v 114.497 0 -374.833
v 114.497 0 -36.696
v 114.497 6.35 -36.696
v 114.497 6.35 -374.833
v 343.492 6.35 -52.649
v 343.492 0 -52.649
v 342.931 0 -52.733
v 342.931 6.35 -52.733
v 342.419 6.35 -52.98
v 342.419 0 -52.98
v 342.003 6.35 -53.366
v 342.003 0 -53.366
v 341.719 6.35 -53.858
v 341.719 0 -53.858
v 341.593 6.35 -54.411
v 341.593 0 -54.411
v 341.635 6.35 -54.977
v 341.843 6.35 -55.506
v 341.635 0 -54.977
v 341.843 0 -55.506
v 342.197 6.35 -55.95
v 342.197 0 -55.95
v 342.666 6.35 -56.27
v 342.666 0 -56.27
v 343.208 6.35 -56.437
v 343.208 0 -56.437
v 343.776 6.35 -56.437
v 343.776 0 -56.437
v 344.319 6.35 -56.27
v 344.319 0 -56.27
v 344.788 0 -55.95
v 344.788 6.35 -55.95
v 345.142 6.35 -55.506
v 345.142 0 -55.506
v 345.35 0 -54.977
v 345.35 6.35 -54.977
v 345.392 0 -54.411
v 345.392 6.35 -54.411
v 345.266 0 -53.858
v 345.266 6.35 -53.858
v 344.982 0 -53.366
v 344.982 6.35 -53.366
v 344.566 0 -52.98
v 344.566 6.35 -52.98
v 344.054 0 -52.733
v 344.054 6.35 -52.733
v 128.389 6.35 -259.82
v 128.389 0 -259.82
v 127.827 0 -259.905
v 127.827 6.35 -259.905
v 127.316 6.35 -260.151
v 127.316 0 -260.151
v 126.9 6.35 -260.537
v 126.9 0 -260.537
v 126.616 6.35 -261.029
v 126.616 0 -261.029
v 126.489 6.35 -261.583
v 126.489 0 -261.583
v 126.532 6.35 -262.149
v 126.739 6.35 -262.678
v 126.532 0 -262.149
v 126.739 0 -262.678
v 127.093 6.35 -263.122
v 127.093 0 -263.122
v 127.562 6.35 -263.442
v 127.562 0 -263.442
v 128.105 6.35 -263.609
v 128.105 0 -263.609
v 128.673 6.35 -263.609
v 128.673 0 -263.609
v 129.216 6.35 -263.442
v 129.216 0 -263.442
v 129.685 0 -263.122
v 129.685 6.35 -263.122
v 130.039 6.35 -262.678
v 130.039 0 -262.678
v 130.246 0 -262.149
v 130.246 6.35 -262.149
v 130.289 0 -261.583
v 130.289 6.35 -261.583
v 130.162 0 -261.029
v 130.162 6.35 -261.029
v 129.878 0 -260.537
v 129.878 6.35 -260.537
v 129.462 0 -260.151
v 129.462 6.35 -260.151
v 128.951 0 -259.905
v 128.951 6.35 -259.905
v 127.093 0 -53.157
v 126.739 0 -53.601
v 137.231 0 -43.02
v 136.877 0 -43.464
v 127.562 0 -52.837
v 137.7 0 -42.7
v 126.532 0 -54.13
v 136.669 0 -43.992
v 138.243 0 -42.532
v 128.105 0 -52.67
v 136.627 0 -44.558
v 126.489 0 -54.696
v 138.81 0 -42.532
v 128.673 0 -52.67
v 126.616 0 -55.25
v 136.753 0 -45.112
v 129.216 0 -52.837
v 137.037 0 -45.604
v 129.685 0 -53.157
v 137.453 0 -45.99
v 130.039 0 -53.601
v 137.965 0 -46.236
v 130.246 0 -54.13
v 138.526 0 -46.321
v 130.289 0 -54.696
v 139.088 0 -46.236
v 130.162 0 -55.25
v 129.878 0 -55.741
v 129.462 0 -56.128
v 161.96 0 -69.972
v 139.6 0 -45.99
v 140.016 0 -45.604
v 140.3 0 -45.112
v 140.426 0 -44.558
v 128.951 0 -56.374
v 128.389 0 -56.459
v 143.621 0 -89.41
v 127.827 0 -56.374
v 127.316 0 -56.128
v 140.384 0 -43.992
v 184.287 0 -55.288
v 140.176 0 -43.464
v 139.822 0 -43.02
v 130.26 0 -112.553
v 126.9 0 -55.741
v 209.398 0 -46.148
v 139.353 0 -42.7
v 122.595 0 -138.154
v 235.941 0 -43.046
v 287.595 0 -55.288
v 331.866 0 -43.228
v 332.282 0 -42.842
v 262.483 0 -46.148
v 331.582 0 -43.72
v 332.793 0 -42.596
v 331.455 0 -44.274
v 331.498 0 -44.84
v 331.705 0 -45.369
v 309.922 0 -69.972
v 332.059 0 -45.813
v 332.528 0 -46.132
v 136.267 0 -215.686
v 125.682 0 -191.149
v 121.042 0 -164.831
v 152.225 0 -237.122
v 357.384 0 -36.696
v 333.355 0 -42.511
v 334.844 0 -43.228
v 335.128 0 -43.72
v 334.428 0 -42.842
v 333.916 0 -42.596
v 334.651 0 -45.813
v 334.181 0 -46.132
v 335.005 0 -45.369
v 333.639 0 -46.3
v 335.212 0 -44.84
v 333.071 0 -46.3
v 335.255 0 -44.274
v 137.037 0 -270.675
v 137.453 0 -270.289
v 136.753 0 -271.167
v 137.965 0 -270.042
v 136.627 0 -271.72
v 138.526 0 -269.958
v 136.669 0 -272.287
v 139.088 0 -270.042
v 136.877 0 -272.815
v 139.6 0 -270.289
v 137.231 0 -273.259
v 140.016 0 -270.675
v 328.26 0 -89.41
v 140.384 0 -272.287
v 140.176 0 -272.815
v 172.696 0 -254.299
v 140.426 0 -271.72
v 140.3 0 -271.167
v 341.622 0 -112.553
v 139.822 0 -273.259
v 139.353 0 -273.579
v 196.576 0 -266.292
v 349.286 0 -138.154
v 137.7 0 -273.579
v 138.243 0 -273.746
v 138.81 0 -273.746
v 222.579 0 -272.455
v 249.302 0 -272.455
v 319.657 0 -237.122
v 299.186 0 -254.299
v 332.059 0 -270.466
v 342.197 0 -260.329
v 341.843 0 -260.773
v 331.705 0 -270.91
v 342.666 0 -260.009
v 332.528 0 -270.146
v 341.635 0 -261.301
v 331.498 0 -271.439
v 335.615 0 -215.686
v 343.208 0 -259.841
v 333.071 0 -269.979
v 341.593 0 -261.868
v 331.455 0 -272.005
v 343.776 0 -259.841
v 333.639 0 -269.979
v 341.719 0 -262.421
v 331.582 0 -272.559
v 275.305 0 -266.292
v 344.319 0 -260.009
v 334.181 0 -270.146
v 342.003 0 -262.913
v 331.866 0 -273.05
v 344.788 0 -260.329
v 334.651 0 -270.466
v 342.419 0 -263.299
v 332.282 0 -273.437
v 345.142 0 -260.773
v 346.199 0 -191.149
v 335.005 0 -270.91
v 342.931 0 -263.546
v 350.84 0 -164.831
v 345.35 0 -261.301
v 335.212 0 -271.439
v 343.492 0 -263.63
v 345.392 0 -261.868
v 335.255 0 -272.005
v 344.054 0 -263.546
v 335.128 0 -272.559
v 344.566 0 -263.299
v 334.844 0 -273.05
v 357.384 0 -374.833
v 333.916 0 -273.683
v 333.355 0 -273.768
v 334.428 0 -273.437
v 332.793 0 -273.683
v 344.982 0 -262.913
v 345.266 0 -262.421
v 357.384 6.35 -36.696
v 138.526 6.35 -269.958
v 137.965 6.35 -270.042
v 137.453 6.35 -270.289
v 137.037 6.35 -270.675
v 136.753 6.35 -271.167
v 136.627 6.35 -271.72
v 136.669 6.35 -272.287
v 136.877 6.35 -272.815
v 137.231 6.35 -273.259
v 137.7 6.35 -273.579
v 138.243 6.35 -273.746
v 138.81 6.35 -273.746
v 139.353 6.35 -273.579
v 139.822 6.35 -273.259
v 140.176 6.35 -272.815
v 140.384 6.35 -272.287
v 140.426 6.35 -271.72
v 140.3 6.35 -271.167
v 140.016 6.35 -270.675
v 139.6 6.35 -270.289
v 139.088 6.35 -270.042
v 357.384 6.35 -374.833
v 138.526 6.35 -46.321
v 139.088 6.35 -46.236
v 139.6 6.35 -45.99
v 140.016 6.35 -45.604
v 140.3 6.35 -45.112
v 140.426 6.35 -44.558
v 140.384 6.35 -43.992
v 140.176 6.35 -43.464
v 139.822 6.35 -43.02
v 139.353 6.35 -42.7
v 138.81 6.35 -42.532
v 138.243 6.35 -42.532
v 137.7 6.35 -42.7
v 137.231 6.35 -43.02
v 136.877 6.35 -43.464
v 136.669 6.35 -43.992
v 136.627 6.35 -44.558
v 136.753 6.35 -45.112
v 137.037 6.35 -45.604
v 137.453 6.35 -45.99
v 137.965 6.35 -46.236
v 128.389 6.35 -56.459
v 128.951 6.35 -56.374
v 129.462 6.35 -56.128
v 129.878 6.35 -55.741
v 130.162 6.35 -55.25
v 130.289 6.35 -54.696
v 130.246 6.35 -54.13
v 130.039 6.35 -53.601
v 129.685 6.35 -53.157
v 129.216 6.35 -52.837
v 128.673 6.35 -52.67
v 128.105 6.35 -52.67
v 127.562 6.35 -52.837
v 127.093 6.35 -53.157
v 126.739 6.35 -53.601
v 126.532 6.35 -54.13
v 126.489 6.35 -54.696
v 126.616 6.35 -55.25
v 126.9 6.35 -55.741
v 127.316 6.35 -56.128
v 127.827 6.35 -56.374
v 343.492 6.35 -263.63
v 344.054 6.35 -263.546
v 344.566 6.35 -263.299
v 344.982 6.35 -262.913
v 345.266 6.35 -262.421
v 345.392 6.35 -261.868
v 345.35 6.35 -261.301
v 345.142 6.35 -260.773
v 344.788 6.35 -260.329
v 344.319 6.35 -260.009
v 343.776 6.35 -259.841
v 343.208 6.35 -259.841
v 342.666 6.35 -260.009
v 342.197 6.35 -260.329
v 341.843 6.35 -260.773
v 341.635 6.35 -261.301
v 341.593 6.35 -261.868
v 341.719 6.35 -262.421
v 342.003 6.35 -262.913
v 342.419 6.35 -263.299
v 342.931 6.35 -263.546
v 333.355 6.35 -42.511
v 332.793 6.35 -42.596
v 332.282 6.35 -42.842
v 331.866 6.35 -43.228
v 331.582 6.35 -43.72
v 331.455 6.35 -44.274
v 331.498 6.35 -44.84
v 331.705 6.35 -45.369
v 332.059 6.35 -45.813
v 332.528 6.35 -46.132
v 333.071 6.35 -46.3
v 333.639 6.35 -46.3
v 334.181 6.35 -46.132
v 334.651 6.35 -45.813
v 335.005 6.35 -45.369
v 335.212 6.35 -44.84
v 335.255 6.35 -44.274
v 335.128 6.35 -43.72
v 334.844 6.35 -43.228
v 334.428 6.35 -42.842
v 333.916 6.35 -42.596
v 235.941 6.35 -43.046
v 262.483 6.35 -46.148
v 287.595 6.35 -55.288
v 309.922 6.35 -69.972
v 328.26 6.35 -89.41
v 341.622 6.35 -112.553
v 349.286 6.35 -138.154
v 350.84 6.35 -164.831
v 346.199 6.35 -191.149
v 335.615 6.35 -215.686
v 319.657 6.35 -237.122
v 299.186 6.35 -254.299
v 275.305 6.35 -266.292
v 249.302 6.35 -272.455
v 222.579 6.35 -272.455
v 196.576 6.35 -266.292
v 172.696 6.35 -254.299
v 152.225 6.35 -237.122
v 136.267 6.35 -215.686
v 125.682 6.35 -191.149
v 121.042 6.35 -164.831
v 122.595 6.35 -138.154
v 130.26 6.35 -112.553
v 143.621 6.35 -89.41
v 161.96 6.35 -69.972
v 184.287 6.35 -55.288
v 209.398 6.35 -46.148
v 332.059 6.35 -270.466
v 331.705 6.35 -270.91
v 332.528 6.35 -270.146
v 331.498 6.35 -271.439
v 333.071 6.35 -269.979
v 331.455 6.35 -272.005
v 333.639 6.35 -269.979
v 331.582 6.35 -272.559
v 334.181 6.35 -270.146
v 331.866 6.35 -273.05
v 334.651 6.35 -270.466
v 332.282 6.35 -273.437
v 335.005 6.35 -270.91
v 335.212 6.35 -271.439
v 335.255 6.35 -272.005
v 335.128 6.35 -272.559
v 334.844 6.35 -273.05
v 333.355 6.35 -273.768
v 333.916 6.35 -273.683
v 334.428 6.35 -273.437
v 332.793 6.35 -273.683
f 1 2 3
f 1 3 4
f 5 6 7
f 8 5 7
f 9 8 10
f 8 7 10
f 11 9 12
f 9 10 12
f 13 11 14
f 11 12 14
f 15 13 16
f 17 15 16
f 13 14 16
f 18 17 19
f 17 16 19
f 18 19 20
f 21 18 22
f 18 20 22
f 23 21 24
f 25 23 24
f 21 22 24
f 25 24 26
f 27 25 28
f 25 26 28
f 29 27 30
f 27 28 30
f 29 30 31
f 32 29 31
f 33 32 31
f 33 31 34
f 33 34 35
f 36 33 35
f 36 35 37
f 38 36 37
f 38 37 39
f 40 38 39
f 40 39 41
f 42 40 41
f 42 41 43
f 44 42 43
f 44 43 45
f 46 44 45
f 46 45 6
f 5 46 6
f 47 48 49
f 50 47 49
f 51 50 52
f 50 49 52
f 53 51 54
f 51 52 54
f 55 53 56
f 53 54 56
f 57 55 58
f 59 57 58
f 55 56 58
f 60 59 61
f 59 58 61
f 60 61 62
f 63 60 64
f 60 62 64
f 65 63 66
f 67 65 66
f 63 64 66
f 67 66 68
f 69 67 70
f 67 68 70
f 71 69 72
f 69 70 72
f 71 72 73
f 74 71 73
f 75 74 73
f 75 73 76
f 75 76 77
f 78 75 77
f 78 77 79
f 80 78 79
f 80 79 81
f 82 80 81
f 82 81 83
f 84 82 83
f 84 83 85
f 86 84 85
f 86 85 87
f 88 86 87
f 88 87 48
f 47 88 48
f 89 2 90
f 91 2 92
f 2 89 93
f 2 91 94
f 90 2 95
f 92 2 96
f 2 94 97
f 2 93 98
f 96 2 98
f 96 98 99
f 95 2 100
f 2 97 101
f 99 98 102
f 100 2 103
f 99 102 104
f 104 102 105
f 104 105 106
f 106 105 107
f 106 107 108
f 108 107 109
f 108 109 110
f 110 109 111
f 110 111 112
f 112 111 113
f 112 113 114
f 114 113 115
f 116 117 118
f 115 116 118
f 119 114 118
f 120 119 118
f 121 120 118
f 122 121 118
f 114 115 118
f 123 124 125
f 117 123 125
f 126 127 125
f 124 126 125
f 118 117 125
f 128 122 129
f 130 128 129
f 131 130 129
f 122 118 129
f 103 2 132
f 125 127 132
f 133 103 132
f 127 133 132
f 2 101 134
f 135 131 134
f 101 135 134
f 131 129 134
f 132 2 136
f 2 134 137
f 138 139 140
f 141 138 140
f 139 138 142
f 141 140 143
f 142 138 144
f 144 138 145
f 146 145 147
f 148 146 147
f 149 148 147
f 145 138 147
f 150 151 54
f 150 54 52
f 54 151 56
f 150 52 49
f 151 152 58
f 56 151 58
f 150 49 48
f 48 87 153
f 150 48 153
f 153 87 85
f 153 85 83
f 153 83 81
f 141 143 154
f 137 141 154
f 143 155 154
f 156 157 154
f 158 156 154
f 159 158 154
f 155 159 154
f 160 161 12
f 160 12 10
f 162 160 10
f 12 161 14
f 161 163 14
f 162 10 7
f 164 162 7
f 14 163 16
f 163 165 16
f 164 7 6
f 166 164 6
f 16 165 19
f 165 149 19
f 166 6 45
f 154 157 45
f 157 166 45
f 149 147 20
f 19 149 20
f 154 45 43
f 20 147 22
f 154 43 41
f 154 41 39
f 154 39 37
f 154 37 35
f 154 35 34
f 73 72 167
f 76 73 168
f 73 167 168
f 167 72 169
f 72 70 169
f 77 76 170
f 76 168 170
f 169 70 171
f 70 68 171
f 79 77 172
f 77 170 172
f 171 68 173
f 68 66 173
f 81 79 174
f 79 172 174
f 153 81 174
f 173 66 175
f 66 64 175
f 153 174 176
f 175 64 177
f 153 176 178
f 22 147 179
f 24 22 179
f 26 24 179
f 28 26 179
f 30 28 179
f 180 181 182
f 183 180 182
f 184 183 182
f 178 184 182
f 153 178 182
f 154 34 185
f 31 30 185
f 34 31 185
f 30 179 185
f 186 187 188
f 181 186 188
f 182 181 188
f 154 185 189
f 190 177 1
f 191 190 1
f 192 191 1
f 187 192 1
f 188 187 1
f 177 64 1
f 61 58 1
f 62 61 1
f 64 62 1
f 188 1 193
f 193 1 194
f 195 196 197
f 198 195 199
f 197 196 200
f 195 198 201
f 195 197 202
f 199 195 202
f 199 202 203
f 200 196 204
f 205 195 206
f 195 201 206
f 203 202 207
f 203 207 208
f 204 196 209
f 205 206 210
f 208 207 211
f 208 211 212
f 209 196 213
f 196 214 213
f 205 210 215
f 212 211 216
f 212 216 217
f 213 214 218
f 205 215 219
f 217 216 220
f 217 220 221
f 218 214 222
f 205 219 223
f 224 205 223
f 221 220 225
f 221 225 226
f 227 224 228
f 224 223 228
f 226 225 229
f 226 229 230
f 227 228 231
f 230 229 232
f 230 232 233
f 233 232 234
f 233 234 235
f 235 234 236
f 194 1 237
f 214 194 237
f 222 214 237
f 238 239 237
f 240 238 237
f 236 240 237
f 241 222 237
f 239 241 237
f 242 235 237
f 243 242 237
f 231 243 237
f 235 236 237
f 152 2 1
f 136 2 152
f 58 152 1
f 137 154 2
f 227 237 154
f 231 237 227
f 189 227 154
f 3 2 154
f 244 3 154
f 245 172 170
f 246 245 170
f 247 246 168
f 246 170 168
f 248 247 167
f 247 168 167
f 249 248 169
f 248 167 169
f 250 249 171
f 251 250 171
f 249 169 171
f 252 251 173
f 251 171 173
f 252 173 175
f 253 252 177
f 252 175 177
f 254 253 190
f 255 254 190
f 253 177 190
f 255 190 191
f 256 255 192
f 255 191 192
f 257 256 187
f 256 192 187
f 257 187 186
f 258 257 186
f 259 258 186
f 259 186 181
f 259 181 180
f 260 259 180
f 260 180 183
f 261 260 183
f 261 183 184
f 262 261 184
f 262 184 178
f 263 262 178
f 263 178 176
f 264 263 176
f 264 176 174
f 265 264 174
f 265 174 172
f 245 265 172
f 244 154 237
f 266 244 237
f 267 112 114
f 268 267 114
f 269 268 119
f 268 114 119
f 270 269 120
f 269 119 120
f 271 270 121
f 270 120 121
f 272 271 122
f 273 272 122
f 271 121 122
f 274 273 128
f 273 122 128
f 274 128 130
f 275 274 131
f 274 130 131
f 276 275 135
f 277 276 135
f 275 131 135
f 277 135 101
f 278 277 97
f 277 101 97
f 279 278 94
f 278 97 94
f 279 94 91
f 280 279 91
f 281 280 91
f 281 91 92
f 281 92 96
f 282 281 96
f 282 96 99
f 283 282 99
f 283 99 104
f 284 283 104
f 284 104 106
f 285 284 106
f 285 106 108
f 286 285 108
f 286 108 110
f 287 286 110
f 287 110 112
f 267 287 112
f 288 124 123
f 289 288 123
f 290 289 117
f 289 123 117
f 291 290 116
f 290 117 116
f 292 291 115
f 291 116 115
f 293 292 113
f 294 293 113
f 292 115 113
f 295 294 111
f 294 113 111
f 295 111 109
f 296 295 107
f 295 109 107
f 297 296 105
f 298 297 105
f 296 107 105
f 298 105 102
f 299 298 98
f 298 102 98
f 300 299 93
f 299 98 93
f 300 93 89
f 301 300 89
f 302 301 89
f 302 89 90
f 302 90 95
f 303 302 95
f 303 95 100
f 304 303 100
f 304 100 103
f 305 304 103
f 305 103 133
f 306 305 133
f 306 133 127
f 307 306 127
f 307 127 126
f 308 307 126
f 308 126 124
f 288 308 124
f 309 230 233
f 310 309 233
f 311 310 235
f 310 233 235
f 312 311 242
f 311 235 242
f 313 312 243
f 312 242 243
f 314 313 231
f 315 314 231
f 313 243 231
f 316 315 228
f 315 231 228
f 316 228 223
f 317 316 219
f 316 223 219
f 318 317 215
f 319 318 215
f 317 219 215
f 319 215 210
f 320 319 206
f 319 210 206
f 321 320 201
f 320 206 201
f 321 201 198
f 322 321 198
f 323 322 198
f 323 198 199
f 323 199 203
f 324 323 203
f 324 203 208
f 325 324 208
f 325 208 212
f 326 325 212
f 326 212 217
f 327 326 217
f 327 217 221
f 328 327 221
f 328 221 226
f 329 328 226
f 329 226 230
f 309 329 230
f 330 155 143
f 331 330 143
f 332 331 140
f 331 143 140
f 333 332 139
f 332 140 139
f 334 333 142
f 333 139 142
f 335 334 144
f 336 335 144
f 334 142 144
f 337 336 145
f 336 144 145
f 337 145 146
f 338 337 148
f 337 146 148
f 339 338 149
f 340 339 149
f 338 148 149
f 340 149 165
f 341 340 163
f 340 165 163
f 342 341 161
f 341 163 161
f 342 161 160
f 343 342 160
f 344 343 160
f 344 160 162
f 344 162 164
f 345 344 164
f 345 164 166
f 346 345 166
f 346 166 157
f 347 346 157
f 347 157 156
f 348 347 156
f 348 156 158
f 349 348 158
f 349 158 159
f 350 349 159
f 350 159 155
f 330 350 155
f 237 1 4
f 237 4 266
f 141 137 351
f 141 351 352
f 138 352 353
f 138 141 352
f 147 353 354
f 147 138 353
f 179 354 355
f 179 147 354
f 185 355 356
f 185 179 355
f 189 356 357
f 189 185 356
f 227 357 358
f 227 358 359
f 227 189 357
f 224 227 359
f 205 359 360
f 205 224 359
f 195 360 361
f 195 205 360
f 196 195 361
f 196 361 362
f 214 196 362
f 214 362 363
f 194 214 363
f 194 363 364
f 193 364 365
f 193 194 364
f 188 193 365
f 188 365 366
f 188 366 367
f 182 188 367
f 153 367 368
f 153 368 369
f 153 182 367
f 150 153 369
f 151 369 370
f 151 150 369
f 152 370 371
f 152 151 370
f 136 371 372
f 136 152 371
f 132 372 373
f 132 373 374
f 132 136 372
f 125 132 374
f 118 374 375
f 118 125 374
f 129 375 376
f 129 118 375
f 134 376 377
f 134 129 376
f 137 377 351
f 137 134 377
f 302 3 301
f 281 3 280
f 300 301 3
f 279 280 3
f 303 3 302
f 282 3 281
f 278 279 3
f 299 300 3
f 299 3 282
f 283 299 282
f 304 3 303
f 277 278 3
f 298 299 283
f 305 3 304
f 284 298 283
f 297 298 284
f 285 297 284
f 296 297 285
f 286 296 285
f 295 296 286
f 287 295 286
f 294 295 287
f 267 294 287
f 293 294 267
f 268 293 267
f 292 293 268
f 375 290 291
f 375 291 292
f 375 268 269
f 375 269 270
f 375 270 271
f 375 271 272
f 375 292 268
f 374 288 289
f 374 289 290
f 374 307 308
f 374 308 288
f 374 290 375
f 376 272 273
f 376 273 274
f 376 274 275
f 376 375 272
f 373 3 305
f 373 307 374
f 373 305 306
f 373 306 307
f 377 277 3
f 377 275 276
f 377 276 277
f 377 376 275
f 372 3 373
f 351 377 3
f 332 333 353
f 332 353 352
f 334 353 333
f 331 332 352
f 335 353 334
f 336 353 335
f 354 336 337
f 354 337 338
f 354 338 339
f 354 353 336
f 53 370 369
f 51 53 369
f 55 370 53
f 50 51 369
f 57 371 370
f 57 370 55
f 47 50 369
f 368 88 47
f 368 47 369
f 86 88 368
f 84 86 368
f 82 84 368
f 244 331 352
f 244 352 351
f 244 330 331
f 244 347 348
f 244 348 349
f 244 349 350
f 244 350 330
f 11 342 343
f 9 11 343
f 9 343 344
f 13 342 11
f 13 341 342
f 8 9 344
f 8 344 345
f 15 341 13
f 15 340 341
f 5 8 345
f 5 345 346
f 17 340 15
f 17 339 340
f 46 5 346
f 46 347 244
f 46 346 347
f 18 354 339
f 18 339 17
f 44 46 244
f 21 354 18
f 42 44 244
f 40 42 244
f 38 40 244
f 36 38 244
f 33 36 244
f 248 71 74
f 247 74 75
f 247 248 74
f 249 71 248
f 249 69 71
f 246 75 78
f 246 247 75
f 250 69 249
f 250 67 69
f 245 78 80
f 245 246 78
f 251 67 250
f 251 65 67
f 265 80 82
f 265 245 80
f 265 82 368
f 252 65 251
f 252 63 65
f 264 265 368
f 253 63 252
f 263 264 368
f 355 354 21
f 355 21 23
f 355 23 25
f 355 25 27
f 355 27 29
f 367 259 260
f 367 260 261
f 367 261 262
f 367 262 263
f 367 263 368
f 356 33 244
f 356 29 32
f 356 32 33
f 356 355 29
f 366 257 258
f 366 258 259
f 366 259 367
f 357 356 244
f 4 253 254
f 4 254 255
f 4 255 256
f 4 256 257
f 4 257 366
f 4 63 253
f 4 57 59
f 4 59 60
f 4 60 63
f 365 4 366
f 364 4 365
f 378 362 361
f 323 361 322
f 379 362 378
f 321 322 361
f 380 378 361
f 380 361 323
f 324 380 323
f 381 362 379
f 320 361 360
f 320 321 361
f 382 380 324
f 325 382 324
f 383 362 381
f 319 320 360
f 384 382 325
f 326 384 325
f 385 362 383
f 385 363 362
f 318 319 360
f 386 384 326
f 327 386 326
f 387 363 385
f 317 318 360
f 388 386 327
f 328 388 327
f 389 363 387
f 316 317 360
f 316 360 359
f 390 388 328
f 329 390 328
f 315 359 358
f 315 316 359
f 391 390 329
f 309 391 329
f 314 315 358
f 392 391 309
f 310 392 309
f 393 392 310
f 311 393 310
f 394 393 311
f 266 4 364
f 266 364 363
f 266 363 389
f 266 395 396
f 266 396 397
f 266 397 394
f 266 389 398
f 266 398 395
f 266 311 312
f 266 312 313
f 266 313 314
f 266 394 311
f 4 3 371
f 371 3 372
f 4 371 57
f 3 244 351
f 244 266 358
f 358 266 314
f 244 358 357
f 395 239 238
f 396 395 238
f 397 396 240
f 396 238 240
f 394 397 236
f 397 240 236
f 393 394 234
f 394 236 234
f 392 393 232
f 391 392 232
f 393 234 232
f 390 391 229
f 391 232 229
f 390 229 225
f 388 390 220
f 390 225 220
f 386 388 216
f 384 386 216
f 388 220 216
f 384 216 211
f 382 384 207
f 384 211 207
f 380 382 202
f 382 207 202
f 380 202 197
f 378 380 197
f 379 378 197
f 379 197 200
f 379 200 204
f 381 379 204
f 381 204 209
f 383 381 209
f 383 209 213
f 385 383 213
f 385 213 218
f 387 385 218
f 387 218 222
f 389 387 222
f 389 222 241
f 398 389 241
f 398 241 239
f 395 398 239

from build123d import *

# Parameters (mm, degrees)
SKETCH1_W           = 242.8875
SKETCH1_H           = 338.1375
SKETCH1_R           = 115.09375
BOSS_EXTRUDE1_DEPTH = 6.35
SKETCH7_R           = 1.905
CUT_EXTRUDE1_DEPTH  = 518.94193961


with BuildPart() as part:
    # Sketch1 → Boss-Extrude1 (new body)
    with BuildSketch(Plane(origin=(0, 0, 0), x_dir=(1, 0, 0), z_dir=(0, 1, 0))):
        with Locations((235.940705356, 205.764388046)):
            Rectangle(SKETCH1_W, SKETCH1_H)
        with Locations(Location((235.940705356, 158.139388046, 0), (0, 0, 270))):
            Circle(SKETCH1_R, mode=Mode.SUBTRACT)
    extrude(amount=BOSS_EXTRUDE1_DEPTH)

    # Sketch7 → Cut-Extrude1 (cut, through all)
    with BuildSketch(Plane.XZ):
        with Locations(Location((138.526478951, -44.416114451, 0), (0, 0, 270))):
            Circle(SKETCH7_R)
        with Locations(Location((128.389000388, -54.553593014, 0), (0, 0, 270))):
            Circle(SKETCH7_R)
        with Locations(Location((343.492410323, -54.553593014, 0), (0, 0, 90))):
            Circle(SKETCH7_R)
        with Locations(Location((333.354931761, -44.416114451, 0), (0, 0, 90))):
            Circle(SKETCH7_R)
        with Locations(Location((333.354931761, -271.862661641, 0), (0, 0, 270))):
            Circle(SKETCH7_R)
        with Locations(Location((343.492410323, -261.725183078, 0), (0, 0, 270))):
            Circle(SKETCH7_R)
        with Locations(Location((128.389000388, -261.725183078, 0), (0, 0, 90))):
            Circle(SKETCH7_R)
        with Locations(Location((138.526478951, -271.862661641, 0), (0, 0, 90))):
            Circle(SKETCH7_R)
    extrude(amount=-CUT_EXTRUDE1_DEPTH, mode=Mode.SUBTRACT)


solid = part.part
